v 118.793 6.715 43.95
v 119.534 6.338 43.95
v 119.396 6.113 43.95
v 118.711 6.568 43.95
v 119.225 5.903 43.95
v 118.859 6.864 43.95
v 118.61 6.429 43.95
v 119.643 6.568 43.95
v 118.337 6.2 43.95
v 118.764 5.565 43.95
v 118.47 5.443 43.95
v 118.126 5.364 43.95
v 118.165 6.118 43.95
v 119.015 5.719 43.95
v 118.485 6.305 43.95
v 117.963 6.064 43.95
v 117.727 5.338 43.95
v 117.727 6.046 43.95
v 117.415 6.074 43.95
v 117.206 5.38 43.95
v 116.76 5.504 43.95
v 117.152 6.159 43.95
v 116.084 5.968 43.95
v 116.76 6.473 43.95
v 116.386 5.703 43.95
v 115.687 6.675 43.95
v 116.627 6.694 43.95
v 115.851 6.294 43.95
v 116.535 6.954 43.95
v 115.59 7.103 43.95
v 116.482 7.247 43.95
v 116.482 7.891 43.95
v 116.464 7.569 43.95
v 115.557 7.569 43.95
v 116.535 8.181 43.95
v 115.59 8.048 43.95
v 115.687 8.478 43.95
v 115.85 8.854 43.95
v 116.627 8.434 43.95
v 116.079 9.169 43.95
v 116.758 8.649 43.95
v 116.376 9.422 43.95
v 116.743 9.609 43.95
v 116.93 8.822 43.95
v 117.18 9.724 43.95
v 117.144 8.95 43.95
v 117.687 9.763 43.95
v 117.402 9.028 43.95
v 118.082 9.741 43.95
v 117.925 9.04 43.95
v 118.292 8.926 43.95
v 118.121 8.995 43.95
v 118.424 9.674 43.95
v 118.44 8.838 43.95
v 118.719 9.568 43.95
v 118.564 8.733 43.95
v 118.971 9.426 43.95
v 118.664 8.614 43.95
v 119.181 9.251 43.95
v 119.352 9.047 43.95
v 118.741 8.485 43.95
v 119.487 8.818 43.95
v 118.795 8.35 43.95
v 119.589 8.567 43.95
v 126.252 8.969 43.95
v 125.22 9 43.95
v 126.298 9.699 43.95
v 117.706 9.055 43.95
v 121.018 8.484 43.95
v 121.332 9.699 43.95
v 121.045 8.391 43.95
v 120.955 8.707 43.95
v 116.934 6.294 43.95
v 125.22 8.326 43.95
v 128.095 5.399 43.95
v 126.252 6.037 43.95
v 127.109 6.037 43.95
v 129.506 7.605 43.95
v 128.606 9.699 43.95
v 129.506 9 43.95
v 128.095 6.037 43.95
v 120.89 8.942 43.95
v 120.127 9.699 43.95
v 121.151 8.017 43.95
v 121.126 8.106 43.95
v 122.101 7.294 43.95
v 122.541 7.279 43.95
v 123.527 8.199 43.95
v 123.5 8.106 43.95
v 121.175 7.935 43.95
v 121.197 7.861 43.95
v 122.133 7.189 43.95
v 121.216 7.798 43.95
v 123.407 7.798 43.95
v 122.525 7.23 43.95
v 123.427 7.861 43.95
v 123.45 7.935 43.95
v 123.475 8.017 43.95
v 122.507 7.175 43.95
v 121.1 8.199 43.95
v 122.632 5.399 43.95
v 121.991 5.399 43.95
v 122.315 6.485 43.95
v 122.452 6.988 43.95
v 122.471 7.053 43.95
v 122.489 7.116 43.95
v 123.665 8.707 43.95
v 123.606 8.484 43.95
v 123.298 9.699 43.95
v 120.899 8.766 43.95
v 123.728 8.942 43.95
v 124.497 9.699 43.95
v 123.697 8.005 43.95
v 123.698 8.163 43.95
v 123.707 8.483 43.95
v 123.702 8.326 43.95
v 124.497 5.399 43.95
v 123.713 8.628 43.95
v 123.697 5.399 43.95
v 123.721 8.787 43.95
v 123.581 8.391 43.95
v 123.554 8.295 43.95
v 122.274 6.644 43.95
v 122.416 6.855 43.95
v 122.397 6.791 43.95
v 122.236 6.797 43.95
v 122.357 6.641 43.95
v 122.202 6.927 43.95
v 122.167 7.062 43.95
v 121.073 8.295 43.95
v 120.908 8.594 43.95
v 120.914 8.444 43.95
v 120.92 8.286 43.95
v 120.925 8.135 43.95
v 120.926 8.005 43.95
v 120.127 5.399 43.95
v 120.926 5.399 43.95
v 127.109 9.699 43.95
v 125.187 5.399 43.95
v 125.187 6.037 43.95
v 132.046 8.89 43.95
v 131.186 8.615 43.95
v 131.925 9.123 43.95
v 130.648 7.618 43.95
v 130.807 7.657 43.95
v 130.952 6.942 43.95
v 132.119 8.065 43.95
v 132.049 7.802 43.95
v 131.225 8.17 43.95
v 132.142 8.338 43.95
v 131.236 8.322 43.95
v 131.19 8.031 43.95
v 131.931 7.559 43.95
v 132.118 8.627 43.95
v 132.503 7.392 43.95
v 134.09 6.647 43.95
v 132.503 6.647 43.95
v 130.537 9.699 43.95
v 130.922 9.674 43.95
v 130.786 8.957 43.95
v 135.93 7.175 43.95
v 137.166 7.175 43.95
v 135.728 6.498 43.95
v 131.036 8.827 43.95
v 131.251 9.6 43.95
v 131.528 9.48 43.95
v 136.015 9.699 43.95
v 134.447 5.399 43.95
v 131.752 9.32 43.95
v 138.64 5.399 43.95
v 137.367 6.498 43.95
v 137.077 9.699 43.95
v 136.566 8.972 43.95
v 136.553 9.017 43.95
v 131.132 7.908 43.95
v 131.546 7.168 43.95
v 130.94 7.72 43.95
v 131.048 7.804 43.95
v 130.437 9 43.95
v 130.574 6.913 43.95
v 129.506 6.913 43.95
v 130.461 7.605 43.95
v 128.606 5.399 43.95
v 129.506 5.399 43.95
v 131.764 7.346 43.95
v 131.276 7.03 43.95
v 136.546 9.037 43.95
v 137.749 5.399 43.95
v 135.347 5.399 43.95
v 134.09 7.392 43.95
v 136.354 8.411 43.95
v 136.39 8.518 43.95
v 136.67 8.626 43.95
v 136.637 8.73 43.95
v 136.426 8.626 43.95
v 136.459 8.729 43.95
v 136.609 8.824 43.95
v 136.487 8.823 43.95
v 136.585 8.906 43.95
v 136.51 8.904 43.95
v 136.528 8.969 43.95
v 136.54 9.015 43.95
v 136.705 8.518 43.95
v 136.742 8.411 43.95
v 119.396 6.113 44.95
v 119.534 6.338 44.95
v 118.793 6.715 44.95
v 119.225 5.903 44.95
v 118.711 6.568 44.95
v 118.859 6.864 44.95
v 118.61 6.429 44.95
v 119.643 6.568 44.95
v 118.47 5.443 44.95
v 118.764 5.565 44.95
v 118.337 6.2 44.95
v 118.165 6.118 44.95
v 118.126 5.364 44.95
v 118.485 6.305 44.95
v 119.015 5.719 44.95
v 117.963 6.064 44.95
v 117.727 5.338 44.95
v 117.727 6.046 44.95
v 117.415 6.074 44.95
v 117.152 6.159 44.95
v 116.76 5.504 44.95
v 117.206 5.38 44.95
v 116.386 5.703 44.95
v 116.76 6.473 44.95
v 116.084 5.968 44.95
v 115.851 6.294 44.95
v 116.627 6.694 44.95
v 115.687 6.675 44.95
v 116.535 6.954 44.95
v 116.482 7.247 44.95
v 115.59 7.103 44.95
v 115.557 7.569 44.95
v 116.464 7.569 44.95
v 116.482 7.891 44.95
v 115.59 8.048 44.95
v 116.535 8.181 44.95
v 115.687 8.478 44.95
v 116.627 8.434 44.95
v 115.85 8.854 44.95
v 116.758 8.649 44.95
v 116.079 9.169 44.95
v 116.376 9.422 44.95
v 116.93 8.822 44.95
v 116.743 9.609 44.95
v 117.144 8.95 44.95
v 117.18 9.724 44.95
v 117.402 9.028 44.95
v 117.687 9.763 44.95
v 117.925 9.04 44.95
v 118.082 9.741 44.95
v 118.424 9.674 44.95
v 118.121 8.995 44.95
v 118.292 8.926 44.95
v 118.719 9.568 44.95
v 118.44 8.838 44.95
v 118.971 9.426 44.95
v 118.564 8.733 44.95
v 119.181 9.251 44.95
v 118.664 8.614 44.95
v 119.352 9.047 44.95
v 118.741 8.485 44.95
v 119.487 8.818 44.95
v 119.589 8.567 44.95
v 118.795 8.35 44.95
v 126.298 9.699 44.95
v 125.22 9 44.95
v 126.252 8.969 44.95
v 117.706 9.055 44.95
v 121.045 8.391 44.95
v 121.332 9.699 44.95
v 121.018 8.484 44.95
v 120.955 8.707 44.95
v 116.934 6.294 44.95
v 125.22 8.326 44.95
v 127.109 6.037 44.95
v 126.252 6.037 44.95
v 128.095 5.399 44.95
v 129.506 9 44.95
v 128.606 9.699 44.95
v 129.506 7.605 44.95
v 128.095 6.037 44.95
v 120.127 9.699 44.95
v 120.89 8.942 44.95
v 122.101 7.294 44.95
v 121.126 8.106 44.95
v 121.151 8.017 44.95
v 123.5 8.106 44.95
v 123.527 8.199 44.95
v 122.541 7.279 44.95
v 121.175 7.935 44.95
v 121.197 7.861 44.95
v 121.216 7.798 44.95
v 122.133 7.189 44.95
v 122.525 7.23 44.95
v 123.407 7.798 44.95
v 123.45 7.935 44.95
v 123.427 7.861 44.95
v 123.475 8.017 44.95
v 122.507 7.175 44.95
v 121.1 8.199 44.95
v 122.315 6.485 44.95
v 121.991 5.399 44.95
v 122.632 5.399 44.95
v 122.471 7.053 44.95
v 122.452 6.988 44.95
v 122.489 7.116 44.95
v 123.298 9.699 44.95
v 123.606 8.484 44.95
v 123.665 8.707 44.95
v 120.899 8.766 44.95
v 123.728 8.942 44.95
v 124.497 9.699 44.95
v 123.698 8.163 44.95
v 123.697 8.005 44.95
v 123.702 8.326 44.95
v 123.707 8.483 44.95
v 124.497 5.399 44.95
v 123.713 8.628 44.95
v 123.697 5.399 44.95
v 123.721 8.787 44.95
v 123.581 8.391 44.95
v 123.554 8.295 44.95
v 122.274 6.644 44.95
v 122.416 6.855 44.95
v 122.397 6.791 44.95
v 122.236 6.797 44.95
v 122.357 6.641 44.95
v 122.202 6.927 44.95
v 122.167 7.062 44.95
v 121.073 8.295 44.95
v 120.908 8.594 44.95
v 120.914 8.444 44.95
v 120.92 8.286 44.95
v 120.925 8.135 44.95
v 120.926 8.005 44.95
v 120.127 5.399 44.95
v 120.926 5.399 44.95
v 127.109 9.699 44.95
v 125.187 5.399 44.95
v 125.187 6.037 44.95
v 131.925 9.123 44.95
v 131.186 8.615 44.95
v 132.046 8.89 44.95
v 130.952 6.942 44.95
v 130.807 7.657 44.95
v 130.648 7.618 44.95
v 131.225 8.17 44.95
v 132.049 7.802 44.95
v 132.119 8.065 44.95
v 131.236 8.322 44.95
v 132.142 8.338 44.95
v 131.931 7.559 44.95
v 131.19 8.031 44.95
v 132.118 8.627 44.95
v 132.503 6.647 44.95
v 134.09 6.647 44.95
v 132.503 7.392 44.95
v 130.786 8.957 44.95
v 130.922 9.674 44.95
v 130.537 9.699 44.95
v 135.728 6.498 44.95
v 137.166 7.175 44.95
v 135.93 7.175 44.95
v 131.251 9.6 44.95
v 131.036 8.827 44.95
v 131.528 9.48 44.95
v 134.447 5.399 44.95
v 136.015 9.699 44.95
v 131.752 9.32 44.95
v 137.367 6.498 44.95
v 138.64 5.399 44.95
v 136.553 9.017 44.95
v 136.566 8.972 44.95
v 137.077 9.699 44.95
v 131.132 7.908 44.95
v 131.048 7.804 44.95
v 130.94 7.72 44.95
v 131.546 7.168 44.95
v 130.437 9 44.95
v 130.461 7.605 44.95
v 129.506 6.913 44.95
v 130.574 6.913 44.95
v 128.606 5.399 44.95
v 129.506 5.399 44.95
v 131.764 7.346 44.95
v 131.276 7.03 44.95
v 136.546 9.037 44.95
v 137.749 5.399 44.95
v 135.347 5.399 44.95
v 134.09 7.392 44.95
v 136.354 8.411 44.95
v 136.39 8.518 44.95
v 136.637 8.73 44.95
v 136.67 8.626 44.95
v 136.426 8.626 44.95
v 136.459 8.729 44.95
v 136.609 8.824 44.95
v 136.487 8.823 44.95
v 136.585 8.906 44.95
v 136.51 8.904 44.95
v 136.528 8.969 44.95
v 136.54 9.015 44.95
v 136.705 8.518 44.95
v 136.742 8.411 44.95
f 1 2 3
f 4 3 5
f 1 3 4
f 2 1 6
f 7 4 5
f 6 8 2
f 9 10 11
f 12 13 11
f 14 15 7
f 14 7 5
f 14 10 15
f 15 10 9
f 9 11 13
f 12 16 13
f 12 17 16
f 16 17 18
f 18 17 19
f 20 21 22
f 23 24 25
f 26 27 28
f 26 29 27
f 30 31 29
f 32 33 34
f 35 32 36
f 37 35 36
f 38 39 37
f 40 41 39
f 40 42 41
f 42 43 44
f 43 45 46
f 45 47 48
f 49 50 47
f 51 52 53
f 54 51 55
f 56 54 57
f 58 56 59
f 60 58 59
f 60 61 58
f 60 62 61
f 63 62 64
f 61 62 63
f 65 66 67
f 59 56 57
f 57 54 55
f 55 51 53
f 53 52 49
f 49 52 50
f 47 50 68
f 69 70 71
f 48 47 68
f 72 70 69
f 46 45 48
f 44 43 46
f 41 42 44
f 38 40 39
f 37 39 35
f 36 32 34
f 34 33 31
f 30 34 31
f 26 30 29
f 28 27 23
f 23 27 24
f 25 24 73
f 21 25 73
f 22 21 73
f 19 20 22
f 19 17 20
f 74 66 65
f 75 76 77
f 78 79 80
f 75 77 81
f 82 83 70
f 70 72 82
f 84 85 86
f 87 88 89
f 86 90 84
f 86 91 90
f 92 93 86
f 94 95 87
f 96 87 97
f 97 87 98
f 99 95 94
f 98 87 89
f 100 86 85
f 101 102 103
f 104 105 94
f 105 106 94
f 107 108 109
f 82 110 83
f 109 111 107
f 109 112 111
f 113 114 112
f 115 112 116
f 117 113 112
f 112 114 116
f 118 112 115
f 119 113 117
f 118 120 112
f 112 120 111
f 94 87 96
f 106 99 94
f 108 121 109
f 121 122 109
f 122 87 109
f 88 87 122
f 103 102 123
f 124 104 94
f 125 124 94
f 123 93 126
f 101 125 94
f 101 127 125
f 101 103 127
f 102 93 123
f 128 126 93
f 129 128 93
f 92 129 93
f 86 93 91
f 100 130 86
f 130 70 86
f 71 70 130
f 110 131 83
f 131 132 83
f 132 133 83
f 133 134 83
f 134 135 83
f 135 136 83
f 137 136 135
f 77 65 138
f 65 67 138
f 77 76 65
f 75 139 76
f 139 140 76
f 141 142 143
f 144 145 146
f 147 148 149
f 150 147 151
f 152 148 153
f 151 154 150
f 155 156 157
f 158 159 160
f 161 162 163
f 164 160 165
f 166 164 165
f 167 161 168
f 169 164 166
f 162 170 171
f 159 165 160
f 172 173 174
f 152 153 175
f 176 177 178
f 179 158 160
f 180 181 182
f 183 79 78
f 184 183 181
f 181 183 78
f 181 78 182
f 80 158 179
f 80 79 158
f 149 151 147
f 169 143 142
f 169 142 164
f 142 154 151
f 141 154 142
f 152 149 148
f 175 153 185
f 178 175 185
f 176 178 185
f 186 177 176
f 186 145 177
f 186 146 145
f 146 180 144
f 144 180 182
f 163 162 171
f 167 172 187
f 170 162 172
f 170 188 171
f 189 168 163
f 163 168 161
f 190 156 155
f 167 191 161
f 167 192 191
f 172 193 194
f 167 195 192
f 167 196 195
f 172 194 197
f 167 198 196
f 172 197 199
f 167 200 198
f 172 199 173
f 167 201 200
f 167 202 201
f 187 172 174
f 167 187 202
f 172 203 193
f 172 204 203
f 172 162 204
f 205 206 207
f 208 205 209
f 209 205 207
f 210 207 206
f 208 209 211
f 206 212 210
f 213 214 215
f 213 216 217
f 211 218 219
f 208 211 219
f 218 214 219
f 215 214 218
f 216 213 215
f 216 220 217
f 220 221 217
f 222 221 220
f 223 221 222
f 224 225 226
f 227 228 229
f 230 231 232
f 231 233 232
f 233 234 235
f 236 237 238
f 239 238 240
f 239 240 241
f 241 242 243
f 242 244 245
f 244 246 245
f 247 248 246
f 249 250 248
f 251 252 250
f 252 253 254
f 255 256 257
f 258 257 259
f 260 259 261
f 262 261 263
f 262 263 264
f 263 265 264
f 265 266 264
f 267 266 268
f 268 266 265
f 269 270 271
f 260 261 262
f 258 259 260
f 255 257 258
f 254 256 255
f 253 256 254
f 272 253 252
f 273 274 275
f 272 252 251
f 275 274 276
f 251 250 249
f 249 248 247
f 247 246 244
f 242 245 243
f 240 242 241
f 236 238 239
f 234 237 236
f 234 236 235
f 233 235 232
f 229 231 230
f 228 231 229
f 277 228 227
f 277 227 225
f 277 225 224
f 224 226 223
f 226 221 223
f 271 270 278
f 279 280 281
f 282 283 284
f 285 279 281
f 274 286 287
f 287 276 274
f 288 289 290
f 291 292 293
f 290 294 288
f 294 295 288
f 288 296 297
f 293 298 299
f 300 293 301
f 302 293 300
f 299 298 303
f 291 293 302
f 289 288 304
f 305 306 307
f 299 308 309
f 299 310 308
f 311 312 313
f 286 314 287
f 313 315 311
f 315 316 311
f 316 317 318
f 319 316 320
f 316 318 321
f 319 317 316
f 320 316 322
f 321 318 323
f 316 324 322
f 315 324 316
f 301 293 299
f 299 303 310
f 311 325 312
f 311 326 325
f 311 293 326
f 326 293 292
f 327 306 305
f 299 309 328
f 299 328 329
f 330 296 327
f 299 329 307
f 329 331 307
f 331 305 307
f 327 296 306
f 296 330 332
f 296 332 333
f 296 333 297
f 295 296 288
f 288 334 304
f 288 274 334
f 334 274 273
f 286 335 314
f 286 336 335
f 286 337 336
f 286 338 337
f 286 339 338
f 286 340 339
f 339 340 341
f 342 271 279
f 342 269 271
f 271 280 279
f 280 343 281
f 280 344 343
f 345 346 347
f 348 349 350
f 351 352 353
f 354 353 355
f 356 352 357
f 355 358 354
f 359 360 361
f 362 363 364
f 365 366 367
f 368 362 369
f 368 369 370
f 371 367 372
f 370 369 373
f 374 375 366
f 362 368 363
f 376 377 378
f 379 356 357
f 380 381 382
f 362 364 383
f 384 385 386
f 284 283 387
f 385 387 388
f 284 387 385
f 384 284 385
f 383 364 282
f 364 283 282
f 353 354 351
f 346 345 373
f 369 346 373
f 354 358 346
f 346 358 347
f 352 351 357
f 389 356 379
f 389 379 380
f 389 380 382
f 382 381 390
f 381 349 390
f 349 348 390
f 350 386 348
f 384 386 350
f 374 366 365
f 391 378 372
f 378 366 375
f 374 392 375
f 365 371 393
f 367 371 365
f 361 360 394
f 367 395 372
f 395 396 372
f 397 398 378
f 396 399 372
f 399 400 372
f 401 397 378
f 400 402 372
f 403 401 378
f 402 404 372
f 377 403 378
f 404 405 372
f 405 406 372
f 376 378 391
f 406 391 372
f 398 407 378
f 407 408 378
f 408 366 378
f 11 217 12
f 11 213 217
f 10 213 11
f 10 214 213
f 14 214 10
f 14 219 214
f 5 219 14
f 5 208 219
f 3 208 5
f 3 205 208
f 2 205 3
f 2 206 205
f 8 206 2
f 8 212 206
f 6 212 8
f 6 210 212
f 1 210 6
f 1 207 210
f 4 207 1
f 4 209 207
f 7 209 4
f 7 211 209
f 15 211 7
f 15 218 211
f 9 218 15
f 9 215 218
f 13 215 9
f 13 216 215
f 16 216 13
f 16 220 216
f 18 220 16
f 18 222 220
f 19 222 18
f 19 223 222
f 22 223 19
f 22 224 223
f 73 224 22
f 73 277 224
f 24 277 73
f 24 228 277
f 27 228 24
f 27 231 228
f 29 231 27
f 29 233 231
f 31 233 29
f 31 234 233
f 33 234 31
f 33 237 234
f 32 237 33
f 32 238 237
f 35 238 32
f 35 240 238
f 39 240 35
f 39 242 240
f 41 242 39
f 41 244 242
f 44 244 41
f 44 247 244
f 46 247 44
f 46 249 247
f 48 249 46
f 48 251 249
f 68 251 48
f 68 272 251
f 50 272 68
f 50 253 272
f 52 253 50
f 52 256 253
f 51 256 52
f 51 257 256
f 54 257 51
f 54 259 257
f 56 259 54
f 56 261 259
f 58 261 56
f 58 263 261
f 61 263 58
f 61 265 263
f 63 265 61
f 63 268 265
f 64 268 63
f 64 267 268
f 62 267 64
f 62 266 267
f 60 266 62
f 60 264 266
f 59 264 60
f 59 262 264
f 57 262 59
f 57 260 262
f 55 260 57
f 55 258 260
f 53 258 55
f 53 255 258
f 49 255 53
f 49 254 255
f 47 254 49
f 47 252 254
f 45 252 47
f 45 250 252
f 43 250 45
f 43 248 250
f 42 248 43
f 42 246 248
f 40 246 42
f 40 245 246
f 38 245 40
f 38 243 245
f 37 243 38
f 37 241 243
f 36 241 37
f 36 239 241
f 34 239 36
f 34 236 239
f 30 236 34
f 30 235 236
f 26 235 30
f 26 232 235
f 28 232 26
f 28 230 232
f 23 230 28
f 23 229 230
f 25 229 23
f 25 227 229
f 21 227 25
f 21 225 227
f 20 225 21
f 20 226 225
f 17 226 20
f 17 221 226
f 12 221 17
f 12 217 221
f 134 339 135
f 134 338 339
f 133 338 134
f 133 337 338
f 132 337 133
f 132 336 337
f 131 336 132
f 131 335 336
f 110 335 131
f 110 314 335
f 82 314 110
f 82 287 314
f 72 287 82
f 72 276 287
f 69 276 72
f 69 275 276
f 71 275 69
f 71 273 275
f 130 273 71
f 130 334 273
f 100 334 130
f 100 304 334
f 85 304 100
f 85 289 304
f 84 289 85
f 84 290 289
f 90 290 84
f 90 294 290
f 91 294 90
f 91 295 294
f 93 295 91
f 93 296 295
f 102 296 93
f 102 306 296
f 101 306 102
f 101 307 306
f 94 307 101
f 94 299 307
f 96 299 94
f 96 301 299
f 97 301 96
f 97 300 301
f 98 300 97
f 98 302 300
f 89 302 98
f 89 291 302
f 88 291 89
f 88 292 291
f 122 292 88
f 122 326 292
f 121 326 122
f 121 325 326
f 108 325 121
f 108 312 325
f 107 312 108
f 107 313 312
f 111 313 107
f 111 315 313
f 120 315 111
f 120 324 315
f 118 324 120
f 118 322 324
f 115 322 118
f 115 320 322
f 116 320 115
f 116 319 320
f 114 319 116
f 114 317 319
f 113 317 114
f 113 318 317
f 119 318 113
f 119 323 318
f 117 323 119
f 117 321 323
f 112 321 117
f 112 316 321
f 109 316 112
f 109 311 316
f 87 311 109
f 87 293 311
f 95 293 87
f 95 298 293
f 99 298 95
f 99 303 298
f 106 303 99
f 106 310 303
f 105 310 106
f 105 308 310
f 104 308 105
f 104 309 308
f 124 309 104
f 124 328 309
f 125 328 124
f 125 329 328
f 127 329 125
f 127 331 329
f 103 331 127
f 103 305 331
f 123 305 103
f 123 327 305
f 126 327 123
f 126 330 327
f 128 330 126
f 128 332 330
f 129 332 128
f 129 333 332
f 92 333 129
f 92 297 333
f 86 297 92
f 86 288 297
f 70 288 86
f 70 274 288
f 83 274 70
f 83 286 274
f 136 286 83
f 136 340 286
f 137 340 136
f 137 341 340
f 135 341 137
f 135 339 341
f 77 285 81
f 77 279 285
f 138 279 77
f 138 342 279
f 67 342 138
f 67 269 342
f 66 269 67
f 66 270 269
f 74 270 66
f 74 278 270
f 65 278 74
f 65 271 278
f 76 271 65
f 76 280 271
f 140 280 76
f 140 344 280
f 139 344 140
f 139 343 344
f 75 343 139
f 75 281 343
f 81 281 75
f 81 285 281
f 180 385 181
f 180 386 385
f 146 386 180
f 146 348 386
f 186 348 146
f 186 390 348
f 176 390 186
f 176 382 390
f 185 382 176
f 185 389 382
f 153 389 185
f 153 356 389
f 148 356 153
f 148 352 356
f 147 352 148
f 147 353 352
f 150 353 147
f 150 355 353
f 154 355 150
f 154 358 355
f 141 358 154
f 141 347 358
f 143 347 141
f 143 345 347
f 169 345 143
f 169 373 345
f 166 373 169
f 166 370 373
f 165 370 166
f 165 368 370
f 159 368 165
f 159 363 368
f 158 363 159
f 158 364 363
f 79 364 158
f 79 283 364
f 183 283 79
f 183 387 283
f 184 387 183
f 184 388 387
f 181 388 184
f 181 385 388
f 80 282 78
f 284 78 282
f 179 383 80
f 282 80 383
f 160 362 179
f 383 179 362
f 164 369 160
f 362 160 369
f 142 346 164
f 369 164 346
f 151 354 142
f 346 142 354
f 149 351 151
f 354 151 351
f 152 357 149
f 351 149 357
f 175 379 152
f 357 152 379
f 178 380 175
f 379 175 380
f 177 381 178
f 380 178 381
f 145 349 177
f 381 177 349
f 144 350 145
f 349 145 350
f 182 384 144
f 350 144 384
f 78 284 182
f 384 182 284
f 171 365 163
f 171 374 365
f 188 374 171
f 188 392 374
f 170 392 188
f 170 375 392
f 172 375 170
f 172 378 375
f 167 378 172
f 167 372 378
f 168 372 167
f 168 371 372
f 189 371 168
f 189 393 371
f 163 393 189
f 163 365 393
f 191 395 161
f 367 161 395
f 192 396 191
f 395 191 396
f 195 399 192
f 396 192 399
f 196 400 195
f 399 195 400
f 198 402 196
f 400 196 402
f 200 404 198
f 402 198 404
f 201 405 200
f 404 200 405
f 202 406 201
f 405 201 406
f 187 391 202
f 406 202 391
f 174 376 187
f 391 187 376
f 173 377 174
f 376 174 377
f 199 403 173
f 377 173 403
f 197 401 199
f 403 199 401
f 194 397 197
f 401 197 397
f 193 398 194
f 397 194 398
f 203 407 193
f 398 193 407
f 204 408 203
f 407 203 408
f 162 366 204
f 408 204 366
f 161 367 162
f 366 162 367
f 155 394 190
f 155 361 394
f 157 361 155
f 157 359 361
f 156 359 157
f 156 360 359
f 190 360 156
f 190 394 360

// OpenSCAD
// CM1P-A ID text, engraved 0.5 into the plate's top face (frame as cm1p_a_freecad.py).
translate([127, 7.5, 43.95]) linear_extrude(1) text("CM1P-A", size = 4.5, font = "Liberation Sans:style=Bold", halign = "center", valign = "center");
